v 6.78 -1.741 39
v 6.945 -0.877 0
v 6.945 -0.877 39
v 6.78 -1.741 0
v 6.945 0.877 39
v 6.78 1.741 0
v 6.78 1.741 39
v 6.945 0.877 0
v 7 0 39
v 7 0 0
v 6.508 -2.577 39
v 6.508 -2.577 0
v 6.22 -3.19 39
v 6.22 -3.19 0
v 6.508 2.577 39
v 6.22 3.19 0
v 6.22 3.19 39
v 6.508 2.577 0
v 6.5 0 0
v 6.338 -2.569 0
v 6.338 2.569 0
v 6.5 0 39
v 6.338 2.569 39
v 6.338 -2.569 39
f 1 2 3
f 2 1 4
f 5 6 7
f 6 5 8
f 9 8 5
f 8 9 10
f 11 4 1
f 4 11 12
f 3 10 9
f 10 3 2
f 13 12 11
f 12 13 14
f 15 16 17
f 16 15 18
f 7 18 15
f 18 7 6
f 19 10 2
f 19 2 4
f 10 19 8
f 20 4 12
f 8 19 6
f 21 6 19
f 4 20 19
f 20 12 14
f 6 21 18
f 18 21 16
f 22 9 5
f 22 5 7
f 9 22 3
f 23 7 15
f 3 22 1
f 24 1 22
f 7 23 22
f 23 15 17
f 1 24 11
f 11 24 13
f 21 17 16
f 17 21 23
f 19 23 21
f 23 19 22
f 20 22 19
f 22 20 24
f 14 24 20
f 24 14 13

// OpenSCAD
$fn = 50;


difference() {
	union() {
		cylinder(h = 39, r = 7.0000000000);
		translate(v = [-17.0000000000, 0, 0]) {
			cylinder(h = 39, r = 7.0000000000);
		}
	}
	union() {
		cylinder(h = 39, r = 3.2500000000);
		cylinder(h = 39, r = 1.8000000000);
		cylinder(h = 39, r = 1.8000000000);
		cylinder(h = 39, r = 1.8000000000);
		translate(v = [-21.5000000000, 0, 0]) {
			hull() {
				translate(v = [-3.7500000000, 0.0000000000, 0]) {
					cylinder(h = 39, r = 10.5000000000);
				}
				translate(v = [3.7500000000, 0.0000000000, 0]) {
					cylinder(h = 39, r = 10.5000000000);
				}
				translate(v = [-3.7500000000, -0.0000000000, 0]) {
					cylinder(h = 39, r = 10.5000000000);
				}
				translate(v = [3.7500000000, -0.0000000000, 0]) {
					cylinder(h = 39, r = 10.5000000000);
				}
			}
		}
		translate(v = [-14.0000000000, 0, 0.0000000000]) {
			cylinder(h = 39, r = 20.5000000000);
		}
	}
}
